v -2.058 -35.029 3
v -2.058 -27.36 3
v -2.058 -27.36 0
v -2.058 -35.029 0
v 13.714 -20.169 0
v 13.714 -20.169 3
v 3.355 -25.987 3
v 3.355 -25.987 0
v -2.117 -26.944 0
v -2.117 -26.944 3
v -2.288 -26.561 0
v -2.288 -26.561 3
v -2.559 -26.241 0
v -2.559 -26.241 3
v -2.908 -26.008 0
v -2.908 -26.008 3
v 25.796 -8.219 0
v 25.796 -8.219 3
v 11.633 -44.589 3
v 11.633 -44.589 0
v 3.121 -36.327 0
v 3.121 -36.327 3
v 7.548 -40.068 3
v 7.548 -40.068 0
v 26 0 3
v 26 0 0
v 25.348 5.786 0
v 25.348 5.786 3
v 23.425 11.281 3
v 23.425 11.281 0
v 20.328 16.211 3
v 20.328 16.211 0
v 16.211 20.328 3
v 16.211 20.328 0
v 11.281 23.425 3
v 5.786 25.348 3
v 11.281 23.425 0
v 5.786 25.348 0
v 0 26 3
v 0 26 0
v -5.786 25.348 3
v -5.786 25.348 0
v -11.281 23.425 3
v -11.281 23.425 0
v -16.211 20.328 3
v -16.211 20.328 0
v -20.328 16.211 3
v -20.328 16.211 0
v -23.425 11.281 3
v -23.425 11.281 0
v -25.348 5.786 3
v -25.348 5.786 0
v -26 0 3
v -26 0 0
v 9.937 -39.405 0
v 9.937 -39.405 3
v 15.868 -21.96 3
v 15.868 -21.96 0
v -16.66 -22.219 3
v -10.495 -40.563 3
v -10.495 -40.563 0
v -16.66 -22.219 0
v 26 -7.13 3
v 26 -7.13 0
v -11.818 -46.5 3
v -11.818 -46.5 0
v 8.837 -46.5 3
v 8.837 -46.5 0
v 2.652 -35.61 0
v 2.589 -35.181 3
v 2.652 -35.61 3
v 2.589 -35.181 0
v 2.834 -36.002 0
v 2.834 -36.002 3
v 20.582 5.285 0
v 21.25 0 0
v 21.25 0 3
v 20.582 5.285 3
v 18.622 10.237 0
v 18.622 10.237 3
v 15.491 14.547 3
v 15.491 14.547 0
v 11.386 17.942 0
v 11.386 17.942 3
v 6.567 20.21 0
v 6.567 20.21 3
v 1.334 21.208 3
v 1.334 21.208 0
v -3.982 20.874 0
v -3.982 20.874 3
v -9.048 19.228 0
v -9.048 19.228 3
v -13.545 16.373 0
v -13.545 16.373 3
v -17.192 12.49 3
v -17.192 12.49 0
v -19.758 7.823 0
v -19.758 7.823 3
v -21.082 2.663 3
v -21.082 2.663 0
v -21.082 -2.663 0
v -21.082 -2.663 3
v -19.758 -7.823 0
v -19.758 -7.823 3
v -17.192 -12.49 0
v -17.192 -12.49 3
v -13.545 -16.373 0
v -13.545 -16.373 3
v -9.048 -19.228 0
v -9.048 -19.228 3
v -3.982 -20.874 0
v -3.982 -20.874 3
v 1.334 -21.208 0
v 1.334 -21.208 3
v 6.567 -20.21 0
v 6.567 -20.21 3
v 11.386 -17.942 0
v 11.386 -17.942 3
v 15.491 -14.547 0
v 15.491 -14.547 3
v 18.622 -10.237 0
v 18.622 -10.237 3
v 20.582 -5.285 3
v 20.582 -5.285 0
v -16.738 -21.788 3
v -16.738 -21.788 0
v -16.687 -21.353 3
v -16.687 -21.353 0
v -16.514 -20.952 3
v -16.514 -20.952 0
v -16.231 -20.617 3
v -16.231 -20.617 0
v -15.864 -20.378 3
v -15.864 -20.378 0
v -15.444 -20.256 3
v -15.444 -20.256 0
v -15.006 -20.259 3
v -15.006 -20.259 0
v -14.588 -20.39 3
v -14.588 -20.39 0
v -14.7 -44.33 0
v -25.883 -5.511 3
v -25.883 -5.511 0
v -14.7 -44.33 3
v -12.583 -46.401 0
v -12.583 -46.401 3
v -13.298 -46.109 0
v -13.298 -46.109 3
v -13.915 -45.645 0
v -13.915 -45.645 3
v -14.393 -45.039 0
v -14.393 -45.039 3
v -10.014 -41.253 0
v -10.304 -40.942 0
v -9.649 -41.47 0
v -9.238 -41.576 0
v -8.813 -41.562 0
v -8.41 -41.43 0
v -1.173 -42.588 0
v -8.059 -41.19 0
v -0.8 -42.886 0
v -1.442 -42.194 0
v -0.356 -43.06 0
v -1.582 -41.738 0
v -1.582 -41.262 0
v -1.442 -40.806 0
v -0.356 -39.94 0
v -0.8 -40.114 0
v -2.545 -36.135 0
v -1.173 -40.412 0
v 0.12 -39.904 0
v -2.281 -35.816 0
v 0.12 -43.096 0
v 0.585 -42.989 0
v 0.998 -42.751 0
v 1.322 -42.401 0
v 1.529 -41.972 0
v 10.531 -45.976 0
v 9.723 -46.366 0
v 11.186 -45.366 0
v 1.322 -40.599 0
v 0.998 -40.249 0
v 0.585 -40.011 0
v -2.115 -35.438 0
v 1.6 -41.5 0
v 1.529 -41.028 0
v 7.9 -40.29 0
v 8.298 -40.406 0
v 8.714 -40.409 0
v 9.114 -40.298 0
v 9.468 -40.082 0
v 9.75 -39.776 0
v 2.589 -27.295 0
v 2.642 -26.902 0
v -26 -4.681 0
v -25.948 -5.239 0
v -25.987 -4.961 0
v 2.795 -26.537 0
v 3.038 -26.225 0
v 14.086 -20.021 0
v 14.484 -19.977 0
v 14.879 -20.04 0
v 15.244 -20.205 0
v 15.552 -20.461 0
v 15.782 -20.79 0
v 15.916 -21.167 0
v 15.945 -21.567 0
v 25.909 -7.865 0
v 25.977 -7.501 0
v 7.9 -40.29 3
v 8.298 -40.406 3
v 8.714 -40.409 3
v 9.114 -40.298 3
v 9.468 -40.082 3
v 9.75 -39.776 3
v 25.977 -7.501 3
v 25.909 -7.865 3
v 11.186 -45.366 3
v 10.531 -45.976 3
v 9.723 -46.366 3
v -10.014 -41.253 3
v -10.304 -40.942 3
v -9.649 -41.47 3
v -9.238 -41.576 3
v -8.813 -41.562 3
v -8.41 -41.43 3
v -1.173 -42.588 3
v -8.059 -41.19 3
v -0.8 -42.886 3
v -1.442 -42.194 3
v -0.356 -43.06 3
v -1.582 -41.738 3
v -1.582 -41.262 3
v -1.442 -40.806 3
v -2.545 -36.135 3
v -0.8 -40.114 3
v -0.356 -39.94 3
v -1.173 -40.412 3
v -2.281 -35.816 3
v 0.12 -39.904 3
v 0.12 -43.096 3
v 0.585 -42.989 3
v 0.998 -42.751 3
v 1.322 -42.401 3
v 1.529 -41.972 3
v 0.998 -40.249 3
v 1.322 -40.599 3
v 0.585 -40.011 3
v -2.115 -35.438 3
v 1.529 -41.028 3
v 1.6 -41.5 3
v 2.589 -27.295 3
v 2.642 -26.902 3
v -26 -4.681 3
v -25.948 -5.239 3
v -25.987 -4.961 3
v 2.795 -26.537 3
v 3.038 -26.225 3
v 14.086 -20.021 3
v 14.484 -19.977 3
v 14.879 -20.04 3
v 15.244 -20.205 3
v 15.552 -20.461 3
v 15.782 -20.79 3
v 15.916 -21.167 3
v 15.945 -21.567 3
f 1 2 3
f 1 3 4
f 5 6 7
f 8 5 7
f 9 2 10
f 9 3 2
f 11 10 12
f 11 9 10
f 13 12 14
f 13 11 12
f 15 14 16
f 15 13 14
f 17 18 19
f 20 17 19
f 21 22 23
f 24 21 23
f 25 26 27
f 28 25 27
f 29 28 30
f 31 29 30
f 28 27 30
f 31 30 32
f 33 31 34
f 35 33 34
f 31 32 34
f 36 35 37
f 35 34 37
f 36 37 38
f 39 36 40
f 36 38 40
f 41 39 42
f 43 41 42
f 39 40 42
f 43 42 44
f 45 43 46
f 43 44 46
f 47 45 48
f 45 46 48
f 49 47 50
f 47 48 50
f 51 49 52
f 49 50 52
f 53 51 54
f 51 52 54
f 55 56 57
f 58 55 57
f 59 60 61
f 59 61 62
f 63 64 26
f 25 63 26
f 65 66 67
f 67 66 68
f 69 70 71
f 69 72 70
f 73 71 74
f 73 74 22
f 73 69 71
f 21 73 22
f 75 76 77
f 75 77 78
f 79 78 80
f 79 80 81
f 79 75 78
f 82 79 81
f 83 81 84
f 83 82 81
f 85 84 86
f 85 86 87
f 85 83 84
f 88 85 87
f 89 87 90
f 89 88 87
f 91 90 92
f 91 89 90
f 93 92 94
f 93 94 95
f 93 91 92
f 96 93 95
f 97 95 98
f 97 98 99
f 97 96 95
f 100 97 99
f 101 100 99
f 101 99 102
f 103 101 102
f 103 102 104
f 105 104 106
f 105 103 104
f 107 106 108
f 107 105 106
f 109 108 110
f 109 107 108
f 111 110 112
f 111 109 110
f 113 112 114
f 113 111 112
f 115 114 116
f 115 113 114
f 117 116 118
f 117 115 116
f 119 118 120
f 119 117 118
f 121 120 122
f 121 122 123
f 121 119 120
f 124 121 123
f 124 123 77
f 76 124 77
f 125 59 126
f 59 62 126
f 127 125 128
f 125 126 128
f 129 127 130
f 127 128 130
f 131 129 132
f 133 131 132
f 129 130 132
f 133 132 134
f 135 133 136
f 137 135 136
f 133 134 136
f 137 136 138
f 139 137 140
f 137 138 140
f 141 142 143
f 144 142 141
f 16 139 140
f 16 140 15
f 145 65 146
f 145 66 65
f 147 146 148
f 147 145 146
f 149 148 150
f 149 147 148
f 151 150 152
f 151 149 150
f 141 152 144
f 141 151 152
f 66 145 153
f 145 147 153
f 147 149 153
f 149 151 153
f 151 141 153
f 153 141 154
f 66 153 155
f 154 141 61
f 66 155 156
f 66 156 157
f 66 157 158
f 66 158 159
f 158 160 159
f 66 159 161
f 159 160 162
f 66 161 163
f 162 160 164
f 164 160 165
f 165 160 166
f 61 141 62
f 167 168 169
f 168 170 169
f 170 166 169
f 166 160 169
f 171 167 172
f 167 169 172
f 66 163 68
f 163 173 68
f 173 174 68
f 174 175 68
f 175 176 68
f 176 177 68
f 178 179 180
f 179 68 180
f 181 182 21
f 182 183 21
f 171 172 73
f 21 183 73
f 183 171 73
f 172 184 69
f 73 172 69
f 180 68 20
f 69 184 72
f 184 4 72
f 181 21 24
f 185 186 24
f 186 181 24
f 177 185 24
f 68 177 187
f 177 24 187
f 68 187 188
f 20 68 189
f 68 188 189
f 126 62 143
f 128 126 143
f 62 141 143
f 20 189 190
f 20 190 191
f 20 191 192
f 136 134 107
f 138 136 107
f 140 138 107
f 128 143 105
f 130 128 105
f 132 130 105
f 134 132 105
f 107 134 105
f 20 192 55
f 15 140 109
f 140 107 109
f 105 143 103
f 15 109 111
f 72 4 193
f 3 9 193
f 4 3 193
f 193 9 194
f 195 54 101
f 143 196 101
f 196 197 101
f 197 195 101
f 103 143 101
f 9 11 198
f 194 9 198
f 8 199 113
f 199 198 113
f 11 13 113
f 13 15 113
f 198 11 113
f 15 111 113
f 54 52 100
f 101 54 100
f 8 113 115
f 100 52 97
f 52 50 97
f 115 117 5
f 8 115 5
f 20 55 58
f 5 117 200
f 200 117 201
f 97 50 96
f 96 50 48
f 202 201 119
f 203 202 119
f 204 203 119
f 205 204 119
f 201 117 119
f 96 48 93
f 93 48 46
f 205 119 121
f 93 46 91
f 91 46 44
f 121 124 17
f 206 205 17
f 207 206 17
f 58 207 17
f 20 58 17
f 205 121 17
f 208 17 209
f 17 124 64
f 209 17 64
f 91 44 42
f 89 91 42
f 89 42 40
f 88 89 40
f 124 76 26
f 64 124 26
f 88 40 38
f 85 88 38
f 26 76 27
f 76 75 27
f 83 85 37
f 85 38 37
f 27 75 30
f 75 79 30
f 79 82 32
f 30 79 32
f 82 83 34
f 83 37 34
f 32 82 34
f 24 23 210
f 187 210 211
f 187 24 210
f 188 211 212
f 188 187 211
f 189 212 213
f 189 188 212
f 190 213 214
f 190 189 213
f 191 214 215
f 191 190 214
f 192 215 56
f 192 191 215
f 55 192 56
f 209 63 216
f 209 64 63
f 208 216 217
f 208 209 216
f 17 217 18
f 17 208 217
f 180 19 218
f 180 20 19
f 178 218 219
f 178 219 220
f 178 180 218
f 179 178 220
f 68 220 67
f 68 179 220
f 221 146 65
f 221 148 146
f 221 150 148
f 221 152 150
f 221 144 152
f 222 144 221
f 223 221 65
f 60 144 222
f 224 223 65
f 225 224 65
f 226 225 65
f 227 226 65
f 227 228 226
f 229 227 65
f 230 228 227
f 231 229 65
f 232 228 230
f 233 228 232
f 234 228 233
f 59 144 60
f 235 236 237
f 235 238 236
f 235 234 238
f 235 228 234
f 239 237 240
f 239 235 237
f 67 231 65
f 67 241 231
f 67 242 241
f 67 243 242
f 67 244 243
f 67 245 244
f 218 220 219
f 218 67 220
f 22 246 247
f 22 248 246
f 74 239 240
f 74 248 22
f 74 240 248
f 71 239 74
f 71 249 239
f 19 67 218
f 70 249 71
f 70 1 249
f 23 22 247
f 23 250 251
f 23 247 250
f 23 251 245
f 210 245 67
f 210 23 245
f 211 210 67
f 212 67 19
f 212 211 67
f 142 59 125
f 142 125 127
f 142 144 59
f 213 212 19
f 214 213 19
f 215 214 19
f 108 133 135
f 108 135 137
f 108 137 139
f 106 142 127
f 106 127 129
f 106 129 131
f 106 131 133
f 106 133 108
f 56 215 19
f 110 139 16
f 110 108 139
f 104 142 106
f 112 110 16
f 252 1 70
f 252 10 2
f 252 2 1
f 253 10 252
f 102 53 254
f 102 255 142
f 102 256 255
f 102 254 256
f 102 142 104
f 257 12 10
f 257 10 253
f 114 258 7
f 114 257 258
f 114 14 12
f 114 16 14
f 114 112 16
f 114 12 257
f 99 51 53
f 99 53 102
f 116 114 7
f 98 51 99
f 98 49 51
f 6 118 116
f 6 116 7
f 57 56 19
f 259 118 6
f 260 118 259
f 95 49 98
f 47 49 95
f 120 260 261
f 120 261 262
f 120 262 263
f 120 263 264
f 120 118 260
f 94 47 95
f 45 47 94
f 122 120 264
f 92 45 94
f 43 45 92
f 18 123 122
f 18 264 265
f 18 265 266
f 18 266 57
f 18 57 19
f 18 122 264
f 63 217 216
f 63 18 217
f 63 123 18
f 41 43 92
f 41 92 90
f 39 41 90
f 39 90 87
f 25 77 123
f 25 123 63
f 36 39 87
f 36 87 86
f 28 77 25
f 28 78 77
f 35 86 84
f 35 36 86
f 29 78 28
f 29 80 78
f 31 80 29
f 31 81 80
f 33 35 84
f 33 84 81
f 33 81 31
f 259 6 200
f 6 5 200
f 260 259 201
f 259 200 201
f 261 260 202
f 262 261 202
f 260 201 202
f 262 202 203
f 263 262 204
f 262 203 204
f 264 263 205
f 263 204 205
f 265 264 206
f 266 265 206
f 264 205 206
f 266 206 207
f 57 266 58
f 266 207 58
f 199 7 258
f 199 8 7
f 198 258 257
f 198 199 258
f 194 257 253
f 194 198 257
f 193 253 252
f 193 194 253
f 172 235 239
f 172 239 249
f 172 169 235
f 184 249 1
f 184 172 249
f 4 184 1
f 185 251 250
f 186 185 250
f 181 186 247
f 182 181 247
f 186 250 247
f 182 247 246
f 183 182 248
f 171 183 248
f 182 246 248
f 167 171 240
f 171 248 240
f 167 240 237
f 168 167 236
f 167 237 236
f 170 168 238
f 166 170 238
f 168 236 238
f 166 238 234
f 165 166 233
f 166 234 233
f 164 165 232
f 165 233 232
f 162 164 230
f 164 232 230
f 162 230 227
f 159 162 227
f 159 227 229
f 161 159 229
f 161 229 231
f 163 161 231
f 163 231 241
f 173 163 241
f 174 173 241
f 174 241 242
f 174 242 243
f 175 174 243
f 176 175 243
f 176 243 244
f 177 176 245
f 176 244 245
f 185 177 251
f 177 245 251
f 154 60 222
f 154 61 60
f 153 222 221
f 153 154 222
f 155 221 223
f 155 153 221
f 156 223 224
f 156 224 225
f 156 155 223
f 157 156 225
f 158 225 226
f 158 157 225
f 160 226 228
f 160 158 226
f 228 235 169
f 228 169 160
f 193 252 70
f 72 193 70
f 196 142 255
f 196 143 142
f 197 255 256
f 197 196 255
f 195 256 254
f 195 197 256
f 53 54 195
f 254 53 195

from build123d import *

# Parameters (mm, degrees)
SKETCH_1_R          = 21.25
EXTRUDE_1_DEPTH     = 3
SKETCH_2_R          = 1.6
CUT_EXTRUDE_1_DEPTH = 3
CUT_EXTRUDE_2_DEPTH = 54.359628934
FILLET_1_R          = 1.5
FILLET_2_R          = 3


with BuildPart() as part:
    # 草图1 → 凸台-拉伸1 (new body)
    with BuildSketch(Plane.XY):
        with BuildLine():
            Line((-26, 0), (-26, -46.5))
            Line((-26, -46.5), (26, -46.5))
            Line((26, -46.5), (26, 0))
            ThreePointArc((26, 0), (0, 26), (-26, 0))
        make_face()
        Circle(SKETCH_1_R, mode=Mode.SUBTRACT)
    extrude(amount=EXTRUDE_1_DEPTH)

    # 草图2 → 切除-拉伸1 (cut)
    with BuildSketch(Plane.XY.offset(3)):
        with Locations((0, -41.5)):
            Circle(SKETCH_2_R)
    extrude(amount=-CUT_EXTRUDE_1_DEPTH, mode=Mode.SUBTRACT)

    # 草图3 → 切除-拉伸2 (cut, through all)
    with BuildSketch(Plane.XY.offset(3)):
        Polygon((-26, -5.104538701), (-14.075326392, -46.5), (-26, -46.5), align=None)
        Polygon((26, -7.693867613), (10.888460039, -46.5), (26, -46.5), align=None)
        Polygon((-17.793337137, -18.847899848), (-2.05818452, -26.416707436), (-2.05818452, -35.688880127), (-9.759778205, -42.749397494), align=None)
        Polygon((17.129406646, -18.250362407), (2.589328912, -26.416707436), (2.589328912, -35.877249364), (9.228633813, -41.487929562), align=None)
    extrude(amount=-CUT_EXTRUDE_2_DEPTH, mode=Mode.SUBTRACT)

    # 圆角1
    fillet_1_edges = [part.edges().sort_by_distance(p)[0] for p in [
        (-9.759778205, -42.749397494, 1.5),
        (-17.793337137, -18.847899848, 1.5),
        (-2.05818452, -26.416707436, 1.5),
        (-2.05818452, -35.688880127, 1.5),
        (17.129406646, -18.250362407, 1.5),
        (9.228633813, -41.487929562, 1.5),
        (2.589328912, -35.877249364, 1.5),
        (2.589328912, -26.416707436, 1.5),
    ]]
    fillet(fillet_1_edges, radius=FILLET_1_R)

    # 圆角2
    fillet_2_edges = [part.edges().sort_by_distance(p)[0] for p in [
        (26, -7.693867613, 1.5),
        (10.888460039, -46.5, 1.5),
        (-26, -5.104538701, 1.5),
        (-14.075326392, -46.5, 1.5),
    ]]
    fillet(fillet_2_edges, radius=FILLET_2_R)


solid = part.part
